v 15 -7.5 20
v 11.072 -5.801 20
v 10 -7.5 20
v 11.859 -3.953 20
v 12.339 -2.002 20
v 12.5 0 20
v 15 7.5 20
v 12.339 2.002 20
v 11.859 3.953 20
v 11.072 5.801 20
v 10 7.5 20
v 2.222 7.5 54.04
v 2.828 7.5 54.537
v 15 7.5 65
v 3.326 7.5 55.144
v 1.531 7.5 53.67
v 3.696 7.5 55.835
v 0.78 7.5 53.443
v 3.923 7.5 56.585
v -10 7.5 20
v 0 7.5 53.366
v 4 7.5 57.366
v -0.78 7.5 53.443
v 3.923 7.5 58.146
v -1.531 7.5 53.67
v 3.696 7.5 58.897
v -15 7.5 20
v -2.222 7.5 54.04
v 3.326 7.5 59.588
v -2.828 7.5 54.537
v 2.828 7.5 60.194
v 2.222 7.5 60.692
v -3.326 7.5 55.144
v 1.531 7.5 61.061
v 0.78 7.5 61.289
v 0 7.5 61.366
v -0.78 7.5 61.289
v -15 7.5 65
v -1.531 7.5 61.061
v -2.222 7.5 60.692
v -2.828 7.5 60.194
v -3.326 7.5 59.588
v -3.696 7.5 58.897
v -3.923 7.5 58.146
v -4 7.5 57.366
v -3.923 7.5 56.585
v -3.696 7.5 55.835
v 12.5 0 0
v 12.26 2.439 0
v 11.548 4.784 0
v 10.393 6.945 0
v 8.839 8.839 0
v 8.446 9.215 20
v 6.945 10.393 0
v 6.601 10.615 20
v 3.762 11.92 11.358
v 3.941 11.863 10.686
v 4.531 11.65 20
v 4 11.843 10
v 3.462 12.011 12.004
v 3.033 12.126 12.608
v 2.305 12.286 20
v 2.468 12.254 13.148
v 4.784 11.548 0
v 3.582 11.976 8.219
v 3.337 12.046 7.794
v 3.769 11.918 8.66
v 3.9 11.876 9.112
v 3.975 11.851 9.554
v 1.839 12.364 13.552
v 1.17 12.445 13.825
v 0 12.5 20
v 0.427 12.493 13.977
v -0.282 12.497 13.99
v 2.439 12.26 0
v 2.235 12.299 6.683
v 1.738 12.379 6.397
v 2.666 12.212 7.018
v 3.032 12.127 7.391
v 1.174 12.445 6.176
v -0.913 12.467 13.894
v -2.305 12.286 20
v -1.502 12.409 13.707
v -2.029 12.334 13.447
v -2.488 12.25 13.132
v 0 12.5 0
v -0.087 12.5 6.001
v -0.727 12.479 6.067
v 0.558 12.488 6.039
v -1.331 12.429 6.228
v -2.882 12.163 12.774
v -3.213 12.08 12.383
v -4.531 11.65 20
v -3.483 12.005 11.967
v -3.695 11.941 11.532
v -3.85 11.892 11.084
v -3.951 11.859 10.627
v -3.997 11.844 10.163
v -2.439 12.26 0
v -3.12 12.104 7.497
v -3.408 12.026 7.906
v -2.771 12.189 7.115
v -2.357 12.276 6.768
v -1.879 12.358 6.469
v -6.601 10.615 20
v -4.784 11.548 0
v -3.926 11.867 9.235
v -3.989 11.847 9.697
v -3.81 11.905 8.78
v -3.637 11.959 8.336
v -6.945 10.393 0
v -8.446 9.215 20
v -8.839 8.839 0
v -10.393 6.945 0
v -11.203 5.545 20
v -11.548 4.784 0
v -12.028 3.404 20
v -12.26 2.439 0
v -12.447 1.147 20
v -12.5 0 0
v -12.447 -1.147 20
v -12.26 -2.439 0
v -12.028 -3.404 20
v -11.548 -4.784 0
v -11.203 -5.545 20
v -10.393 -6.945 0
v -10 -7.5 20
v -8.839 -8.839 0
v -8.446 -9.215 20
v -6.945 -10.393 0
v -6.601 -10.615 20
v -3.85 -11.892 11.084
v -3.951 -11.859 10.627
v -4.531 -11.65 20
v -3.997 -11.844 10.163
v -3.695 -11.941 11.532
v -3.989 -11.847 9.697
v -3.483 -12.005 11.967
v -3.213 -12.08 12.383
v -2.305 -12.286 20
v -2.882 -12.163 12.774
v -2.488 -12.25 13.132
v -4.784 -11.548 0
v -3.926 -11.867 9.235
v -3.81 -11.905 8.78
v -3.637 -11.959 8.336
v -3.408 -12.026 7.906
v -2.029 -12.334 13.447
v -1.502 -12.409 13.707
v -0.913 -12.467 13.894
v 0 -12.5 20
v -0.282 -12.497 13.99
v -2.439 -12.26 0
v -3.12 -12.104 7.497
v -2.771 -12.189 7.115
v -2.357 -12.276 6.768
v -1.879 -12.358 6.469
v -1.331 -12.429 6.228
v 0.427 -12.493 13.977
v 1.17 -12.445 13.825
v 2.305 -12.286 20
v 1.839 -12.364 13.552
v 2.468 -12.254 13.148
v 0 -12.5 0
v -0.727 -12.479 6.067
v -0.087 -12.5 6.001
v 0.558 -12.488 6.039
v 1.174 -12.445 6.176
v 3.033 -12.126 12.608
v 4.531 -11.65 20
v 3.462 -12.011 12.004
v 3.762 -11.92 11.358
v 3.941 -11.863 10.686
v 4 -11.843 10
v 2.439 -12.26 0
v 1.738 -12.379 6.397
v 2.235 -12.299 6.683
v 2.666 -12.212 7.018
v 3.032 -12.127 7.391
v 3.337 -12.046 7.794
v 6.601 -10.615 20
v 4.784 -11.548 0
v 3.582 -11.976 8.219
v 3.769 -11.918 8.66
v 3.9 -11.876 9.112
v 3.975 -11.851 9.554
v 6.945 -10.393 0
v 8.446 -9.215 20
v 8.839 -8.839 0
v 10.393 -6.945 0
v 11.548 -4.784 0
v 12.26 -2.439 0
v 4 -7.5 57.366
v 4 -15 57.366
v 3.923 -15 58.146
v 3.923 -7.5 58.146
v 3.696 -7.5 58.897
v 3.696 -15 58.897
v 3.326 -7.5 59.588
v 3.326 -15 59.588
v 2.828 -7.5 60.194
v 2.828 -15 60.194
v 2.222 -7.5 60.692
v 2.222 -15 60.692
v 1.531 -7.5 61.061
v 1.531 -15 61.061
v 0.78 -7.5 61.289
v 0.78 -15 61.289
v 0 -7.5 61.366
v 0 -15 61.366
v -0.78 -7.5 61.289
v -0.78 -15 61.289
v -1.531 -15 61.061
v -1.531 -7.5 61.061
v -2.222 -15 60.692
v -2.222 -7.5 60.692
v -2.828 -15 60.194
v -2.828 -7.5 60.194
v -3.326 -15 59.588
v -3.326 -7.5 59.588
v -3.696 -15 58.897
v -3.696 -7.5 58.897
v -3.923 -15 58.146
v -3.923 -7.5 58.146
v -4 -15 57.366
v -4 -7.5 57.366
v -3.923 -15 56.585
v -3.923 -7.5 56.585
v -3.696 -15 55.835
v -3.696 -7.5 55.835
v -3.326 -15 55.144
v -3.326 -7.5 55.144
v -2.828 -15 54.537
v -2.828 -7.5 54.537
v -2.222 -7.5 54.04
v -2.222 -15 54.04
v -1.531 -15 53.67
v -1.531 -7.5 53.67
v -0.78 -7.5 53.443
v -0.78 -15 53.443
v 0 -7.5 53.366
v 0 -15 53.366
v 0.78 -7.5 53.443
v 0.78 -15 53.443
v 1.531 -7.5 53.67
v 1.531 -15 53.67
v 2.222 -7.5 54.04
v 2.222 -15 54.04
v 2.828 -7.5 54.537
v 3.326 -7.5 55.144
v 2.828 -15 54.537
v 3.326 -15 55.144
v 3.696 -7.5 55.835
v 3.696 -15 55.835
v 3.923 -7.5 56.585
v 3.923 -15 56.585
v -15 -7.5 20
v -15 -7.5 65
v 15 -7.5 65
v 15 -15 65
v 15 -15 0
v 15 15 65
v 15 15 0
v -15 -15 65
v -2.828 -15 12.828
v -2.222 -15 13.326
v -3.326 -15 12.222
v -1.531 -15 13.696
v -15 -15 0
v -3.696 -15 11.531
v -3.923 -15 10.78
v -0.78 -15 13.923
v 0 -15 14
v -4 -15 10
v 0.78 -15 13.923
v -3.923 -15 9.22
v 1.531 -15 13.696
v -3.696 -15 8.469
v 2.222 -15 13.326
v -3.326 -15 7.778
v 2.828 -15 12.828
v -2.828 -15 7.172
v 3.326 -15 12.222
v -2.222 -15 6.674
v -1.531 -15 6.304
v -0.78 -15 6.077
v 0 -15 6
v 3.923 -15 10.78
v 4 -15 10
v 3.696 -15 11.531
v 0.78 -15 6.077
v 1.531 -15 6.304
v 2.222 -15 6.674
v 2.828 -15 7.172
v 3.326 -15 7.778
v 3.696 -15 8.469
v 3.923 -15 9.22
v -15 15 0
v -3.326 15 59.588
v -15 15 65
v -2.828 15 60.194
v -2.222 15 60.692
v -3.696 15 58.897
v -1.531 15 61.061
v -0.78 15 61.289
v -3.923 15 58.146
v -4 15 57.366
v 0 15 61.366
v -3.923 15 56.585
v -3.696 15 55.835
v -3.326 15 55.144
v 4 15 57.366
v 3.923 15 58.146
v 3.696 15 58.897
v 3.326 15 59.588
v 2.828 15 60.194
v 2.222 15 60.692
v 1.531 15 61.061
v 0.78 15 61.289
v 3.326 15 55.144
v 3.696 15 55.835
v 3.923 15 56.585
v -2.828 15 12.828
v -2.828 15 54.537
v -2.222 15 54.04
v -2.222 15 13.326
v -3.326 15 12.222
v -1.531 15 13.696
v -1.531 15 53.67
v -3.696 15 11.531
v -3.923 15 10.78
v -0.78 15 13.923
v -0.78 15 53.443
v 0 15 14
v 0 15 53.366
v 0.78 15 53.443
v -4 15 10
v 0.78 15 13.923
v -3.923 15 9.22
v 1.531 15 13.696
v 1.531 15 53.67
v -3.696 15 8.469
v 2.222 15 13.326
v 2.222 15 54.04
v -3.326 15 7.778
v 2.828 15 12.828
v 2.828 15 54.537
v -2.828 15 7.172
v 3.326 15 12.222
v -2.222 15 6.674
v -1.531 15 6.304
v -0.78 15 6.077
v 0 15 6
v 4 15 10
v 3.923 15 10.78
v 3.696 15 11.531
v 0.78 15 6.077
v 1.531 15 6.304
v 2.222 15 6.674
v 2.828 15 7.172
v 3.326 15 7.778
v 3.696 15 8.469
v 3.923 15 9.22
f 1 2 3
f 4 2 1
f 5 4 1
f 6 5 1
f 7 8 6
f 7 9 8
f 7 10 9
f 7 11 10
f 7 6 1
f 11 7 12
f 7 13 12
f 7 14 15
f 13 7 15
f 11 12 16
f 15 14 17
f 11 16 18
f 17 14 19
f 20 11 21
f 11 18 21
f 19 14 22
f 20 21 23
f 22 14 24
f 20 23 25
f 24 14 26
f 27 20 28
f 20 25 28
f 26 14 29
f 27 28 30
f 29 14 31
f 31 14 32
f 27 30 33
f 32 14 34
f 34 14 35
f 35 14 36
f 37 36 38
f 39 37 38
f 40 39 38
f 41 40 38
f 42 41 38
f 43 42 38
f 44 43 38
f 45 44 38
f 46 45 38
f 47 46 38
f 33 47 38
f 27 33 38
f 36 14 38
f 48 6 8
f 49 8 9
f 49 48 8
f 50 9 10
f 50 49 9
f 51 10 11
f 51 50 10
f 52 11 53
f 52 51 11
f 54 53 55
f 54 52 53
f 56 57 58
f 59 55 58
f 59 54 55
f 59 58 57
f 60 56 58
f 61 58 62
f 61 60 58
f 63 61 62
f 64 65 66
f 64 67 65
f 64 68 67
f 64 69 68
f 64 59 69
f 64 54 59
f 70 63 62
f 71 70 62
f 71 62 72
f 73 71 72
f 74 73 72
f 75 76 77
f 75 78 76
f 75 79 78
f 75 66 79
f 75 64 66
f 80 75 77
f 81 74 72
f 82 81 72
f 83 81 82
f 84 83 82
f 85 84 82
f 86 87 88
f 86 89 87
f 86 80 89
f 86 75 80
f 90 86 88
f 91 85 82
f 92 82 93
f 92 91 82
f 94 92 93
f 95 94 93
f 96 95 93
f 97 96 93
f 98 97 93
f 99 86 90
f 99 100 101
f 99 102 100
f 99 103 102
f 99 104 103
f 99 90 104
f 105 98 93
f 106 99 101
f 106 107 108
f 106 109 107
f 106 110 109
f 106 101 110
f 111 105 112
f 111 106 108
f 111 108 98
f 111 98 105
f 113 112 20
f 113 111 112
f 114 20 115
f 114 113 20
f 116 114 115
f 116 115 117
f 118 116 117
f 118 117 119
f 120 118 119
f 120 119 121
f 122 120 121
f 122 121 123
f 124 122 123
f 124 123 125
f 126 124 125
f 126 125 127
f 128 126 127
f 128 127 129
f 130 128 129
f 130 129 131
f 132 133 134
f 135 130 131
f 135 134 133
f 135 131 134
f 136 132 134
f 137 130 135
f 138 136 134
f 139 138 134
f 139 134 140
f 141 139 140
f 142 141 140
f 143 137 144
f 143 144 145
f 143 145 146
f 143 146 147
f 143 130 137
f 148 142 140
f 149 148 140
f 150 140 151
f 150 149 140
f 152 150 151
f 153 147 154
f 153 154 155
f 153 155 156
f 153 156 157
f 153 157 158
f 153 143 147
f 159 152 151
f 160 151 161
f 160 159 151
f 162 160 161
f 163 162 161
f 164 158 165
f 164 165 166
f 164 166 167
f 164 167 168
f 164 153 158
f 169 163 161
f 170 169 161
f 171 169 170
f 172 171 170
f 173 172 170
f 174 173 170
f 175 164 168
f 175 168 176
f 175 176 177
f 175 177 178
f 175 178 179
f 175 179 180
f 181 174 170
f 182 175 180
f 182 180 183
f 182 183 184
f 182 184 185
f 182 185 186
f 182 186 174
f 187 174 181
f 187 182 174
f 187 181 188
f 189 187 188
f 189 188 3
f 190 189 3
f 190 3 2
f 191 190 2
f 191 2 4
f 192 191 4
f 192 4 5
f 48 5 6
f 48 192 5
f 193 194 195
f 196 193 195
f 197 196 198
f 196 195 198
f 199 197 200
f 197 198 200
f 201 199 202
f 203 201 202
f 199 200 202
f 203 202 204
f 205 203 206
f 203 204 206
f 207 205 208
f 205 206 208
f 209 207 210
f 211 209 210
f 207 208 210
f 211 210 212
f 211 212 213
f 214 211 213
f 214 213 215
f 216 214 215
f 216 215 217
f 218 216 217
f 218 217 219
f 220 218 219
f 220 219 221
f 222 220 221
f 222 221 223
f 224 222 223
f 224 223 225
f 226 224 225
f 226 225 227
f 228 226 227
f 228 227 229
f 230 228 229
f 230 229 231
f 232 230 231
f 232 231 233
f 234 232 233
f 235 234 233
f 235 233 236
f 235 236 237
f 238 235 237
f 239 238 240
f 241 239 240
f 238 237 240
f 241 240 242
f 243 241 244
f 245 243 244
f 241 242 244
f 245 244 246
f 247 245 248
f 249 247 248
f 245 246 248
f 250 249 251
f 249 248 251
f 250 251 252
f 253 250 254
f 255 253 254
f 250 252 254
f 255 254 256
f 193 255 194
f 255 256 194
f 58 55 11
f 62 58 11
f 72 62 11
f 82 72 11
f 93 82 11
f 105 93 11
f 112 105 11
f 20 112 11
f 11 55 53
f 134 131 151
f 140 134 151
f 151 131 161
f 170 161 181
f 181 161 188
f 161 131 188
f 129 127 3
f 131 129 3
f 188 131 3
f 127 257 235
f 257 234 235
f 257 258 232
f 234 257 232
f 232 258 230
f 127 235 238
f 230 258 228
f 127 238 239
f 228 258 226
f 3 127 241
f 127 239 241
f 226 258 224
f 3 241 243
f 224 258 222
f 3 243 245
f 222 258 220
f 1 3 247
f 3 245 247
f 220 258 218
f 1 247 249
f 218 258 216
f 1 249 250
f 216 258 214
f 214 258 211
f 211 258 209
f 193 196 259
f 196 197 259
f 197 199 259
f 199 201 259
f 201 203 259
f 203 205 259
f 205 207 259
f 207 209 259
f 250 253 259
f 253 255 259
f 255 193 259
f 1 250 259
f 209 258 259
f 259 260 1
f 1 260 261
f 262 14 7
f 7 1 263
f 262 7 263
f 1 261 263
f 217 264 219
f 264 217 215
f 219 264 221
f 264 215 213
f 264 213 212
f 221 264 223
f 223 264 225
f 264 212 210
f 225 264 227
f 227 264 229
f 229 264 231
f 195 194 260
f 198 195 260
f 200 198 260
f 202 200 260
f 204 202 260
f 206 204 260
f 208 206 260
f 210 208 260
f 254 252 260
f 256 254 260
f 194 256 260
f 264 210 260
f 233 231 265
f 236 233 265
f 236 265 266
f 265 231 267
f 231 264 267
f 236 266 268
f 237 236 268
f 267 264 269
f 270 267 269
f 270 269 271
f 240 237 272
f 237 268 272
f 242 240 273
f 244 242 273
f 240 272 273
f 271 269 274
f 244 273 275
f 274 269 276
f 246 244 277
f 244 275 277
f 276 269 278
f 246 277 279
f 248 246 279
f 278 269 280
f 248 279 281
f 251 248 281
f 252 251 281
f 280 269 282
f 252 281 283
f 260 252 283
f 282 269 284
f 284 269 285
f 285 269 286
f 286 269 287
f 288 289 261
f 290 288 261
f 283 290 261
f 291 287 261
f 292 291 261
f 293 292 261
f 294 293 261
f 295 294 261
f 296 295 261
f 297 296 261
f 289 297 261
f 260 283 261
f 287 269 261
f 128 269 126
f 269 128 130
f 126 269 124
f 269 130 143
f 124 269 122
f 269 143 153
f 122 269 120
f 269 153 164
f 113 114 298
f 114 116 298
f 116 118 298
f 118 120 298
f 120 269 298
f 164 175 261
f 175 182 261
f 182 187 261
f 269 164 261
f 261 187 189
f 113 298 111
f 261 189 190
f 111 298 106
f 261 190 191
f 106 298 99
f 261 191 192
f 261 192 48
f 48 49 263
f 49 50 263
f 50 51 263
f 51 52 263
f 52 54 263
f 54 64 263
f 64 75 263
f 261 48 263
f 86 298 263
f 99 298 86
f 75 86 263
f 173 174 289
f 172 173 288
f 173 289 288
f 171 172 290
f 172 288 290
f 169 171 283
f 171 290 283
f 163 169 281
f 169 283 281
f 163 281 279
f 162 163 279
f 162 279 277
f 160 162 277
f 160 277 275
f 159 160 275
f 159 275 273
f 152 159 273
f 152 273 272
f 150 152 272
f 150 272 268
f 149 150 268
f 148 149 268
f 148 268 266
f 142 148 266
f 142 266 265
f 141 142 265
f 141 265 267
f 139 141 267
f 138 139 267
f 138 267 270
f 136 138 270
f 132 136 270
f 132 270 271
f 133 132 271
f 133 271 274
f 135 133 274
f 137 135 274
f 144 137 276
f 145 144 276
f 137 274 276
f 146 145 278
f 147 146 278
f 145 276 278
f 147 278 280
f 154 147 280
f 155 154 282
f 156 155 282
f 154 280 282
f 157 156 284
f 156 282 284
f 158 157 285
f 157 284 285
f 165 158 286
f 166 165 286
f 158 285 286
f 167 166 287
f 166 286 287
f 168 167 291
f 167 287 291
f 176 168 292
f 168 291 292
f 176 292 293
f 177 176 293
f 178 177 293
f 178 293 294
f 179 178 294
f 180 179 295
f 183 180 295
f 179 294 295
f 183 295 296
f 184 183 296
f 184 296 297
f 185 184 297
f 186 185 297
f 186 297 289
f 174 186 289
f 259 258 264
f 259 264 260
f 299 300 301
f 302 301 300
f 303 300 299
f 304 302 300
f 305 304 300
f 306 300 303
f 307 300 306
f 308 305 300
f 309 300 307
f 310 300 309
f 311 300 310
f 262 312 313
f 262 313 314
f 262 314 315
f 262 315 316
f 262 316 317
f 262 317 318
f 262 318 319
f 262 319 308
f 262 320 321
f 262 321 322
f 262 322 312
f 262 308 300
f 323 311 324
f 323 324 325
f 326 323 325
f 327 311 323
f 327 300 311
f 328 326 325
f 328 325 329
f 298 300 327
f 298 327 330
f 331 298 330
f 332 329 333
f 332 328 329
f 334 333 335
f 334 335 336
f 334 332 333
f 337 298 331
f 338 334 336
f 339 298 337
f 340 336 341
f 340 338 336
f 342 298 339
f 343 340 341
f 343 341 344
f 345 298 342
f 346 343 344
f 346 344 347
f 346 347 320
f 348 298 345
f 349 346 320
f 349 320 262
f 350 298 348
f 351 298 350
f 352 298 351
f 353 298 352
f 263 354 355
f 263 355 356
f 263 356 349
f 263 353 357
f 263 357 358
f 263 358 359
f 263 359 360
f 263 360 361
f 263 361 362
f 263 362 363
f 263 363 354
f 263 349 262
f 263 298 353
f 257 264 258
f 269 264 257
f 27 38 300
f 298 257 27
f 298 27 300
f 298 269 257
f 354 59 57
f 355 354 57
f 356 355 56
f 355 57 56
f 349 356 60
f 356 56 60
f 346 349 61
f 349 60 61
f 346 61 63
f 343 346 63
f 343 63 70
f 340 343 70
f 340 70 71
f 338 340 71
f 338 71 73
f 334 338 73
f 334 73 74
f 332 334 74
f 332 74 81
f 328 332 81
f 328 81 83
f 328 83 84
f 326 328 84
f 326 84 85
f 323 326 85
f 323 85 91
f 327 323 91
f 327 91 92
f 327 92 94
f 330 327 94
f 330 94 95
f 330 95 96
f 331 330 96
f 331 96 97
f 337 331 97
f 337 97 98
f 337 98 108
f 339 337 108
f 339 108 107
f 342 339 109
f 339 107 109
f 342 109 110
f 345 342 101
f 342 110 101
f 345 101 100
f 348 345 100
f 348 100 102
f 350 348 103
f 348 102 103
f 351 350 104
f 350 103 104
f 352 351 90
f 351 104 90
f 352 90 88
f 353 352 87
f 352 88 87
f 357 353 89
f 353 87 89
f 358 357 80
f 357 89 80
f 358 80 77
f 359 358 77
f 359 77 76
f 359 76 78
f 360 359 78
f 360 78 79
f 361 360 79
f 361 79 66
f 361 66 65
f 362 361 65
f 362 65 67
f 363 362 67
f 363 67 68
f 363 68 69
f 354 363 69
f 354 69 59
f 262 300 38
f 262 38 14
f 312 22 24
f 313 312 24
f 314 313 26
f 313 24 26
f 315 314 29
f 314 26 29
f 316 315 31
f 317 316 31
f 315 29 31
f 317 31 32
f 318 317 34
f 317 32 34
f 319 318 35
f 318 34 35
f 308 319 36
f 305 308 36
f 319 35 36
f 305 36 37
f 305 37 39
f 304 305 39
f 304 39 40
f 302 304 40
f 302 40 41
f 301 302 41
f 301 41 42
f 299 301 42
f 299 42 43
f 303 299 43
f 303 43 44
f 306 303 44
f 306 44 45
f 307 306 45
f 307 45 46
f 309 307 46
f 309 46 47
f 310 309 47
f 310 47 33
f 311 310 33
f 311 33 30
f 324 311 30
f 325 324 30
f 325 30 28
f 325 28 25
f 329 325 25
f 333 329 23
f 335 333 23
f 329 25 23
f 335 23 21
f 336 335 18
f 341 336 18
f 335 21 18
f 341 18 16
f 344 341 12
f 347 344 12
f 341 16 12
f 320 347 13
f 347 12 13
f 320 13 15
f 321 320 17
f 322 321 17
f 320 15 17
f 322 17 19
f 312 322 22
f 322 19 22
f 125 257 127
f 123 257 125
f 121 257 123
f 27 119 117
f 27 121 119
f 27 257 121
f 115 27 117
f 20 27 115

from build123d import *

# Parameters (mm, degrees)
F0_W     = 30
F0_H     = 30
F0_R     = 12.5
F1_DEPTH = 65
F2_W     = 2.5
F2_H     = 15
F2_W_2   = 30
F3_DEPTH = 45
F4_R     = 4
F5_DEPTH = 30.001
F6_DEPTH = 20


with BuildPart() as f1:
    # F0 (on Top) → F1 (new body)
    with BuildSketch(Plane.XY):
        Rectangle(F0_W, F0_H)
        Circle(F0_R, mode=Mode.SUBTRACT)
        Circle(F0_R)
    extrude(amount=F1_DEPTH)

    # F2 (on face) → F3 (cut)
    with BuildSketch(Plane.XY.offset(65)):
        with Locations((16.25, 0)):
            Rectangle(F2_W, F2_H)
        Rectangle(F2_W_2, F2_H)
        with Locations((-16.25, 0)):
            Rectangle(F2_W, F2_H)
    extrude(amount=-F3_DEPTH, mode=Mode.SUBTRACT)

    # F4 (on face) → F5 (cut, through all)
    with BuildSketch(Plane.XZ.offset(15)):
        with Locations((0, 10)):
            Circle(F4_R)
        with Locations((0, 57.3658570647)):
            Circle(F4_R)
    extrude(amount=-F5_DEPTH, mode=Mode.SUBTRACT)

    # F0 (on Top) → F6 (cut, through all)
    with BuildSketch(Plane.XY):
        Circle(F0_R)
    extrude(amount=F6_DEPTH, mode=Mode.SUBTRACT)


solid = f1.part
